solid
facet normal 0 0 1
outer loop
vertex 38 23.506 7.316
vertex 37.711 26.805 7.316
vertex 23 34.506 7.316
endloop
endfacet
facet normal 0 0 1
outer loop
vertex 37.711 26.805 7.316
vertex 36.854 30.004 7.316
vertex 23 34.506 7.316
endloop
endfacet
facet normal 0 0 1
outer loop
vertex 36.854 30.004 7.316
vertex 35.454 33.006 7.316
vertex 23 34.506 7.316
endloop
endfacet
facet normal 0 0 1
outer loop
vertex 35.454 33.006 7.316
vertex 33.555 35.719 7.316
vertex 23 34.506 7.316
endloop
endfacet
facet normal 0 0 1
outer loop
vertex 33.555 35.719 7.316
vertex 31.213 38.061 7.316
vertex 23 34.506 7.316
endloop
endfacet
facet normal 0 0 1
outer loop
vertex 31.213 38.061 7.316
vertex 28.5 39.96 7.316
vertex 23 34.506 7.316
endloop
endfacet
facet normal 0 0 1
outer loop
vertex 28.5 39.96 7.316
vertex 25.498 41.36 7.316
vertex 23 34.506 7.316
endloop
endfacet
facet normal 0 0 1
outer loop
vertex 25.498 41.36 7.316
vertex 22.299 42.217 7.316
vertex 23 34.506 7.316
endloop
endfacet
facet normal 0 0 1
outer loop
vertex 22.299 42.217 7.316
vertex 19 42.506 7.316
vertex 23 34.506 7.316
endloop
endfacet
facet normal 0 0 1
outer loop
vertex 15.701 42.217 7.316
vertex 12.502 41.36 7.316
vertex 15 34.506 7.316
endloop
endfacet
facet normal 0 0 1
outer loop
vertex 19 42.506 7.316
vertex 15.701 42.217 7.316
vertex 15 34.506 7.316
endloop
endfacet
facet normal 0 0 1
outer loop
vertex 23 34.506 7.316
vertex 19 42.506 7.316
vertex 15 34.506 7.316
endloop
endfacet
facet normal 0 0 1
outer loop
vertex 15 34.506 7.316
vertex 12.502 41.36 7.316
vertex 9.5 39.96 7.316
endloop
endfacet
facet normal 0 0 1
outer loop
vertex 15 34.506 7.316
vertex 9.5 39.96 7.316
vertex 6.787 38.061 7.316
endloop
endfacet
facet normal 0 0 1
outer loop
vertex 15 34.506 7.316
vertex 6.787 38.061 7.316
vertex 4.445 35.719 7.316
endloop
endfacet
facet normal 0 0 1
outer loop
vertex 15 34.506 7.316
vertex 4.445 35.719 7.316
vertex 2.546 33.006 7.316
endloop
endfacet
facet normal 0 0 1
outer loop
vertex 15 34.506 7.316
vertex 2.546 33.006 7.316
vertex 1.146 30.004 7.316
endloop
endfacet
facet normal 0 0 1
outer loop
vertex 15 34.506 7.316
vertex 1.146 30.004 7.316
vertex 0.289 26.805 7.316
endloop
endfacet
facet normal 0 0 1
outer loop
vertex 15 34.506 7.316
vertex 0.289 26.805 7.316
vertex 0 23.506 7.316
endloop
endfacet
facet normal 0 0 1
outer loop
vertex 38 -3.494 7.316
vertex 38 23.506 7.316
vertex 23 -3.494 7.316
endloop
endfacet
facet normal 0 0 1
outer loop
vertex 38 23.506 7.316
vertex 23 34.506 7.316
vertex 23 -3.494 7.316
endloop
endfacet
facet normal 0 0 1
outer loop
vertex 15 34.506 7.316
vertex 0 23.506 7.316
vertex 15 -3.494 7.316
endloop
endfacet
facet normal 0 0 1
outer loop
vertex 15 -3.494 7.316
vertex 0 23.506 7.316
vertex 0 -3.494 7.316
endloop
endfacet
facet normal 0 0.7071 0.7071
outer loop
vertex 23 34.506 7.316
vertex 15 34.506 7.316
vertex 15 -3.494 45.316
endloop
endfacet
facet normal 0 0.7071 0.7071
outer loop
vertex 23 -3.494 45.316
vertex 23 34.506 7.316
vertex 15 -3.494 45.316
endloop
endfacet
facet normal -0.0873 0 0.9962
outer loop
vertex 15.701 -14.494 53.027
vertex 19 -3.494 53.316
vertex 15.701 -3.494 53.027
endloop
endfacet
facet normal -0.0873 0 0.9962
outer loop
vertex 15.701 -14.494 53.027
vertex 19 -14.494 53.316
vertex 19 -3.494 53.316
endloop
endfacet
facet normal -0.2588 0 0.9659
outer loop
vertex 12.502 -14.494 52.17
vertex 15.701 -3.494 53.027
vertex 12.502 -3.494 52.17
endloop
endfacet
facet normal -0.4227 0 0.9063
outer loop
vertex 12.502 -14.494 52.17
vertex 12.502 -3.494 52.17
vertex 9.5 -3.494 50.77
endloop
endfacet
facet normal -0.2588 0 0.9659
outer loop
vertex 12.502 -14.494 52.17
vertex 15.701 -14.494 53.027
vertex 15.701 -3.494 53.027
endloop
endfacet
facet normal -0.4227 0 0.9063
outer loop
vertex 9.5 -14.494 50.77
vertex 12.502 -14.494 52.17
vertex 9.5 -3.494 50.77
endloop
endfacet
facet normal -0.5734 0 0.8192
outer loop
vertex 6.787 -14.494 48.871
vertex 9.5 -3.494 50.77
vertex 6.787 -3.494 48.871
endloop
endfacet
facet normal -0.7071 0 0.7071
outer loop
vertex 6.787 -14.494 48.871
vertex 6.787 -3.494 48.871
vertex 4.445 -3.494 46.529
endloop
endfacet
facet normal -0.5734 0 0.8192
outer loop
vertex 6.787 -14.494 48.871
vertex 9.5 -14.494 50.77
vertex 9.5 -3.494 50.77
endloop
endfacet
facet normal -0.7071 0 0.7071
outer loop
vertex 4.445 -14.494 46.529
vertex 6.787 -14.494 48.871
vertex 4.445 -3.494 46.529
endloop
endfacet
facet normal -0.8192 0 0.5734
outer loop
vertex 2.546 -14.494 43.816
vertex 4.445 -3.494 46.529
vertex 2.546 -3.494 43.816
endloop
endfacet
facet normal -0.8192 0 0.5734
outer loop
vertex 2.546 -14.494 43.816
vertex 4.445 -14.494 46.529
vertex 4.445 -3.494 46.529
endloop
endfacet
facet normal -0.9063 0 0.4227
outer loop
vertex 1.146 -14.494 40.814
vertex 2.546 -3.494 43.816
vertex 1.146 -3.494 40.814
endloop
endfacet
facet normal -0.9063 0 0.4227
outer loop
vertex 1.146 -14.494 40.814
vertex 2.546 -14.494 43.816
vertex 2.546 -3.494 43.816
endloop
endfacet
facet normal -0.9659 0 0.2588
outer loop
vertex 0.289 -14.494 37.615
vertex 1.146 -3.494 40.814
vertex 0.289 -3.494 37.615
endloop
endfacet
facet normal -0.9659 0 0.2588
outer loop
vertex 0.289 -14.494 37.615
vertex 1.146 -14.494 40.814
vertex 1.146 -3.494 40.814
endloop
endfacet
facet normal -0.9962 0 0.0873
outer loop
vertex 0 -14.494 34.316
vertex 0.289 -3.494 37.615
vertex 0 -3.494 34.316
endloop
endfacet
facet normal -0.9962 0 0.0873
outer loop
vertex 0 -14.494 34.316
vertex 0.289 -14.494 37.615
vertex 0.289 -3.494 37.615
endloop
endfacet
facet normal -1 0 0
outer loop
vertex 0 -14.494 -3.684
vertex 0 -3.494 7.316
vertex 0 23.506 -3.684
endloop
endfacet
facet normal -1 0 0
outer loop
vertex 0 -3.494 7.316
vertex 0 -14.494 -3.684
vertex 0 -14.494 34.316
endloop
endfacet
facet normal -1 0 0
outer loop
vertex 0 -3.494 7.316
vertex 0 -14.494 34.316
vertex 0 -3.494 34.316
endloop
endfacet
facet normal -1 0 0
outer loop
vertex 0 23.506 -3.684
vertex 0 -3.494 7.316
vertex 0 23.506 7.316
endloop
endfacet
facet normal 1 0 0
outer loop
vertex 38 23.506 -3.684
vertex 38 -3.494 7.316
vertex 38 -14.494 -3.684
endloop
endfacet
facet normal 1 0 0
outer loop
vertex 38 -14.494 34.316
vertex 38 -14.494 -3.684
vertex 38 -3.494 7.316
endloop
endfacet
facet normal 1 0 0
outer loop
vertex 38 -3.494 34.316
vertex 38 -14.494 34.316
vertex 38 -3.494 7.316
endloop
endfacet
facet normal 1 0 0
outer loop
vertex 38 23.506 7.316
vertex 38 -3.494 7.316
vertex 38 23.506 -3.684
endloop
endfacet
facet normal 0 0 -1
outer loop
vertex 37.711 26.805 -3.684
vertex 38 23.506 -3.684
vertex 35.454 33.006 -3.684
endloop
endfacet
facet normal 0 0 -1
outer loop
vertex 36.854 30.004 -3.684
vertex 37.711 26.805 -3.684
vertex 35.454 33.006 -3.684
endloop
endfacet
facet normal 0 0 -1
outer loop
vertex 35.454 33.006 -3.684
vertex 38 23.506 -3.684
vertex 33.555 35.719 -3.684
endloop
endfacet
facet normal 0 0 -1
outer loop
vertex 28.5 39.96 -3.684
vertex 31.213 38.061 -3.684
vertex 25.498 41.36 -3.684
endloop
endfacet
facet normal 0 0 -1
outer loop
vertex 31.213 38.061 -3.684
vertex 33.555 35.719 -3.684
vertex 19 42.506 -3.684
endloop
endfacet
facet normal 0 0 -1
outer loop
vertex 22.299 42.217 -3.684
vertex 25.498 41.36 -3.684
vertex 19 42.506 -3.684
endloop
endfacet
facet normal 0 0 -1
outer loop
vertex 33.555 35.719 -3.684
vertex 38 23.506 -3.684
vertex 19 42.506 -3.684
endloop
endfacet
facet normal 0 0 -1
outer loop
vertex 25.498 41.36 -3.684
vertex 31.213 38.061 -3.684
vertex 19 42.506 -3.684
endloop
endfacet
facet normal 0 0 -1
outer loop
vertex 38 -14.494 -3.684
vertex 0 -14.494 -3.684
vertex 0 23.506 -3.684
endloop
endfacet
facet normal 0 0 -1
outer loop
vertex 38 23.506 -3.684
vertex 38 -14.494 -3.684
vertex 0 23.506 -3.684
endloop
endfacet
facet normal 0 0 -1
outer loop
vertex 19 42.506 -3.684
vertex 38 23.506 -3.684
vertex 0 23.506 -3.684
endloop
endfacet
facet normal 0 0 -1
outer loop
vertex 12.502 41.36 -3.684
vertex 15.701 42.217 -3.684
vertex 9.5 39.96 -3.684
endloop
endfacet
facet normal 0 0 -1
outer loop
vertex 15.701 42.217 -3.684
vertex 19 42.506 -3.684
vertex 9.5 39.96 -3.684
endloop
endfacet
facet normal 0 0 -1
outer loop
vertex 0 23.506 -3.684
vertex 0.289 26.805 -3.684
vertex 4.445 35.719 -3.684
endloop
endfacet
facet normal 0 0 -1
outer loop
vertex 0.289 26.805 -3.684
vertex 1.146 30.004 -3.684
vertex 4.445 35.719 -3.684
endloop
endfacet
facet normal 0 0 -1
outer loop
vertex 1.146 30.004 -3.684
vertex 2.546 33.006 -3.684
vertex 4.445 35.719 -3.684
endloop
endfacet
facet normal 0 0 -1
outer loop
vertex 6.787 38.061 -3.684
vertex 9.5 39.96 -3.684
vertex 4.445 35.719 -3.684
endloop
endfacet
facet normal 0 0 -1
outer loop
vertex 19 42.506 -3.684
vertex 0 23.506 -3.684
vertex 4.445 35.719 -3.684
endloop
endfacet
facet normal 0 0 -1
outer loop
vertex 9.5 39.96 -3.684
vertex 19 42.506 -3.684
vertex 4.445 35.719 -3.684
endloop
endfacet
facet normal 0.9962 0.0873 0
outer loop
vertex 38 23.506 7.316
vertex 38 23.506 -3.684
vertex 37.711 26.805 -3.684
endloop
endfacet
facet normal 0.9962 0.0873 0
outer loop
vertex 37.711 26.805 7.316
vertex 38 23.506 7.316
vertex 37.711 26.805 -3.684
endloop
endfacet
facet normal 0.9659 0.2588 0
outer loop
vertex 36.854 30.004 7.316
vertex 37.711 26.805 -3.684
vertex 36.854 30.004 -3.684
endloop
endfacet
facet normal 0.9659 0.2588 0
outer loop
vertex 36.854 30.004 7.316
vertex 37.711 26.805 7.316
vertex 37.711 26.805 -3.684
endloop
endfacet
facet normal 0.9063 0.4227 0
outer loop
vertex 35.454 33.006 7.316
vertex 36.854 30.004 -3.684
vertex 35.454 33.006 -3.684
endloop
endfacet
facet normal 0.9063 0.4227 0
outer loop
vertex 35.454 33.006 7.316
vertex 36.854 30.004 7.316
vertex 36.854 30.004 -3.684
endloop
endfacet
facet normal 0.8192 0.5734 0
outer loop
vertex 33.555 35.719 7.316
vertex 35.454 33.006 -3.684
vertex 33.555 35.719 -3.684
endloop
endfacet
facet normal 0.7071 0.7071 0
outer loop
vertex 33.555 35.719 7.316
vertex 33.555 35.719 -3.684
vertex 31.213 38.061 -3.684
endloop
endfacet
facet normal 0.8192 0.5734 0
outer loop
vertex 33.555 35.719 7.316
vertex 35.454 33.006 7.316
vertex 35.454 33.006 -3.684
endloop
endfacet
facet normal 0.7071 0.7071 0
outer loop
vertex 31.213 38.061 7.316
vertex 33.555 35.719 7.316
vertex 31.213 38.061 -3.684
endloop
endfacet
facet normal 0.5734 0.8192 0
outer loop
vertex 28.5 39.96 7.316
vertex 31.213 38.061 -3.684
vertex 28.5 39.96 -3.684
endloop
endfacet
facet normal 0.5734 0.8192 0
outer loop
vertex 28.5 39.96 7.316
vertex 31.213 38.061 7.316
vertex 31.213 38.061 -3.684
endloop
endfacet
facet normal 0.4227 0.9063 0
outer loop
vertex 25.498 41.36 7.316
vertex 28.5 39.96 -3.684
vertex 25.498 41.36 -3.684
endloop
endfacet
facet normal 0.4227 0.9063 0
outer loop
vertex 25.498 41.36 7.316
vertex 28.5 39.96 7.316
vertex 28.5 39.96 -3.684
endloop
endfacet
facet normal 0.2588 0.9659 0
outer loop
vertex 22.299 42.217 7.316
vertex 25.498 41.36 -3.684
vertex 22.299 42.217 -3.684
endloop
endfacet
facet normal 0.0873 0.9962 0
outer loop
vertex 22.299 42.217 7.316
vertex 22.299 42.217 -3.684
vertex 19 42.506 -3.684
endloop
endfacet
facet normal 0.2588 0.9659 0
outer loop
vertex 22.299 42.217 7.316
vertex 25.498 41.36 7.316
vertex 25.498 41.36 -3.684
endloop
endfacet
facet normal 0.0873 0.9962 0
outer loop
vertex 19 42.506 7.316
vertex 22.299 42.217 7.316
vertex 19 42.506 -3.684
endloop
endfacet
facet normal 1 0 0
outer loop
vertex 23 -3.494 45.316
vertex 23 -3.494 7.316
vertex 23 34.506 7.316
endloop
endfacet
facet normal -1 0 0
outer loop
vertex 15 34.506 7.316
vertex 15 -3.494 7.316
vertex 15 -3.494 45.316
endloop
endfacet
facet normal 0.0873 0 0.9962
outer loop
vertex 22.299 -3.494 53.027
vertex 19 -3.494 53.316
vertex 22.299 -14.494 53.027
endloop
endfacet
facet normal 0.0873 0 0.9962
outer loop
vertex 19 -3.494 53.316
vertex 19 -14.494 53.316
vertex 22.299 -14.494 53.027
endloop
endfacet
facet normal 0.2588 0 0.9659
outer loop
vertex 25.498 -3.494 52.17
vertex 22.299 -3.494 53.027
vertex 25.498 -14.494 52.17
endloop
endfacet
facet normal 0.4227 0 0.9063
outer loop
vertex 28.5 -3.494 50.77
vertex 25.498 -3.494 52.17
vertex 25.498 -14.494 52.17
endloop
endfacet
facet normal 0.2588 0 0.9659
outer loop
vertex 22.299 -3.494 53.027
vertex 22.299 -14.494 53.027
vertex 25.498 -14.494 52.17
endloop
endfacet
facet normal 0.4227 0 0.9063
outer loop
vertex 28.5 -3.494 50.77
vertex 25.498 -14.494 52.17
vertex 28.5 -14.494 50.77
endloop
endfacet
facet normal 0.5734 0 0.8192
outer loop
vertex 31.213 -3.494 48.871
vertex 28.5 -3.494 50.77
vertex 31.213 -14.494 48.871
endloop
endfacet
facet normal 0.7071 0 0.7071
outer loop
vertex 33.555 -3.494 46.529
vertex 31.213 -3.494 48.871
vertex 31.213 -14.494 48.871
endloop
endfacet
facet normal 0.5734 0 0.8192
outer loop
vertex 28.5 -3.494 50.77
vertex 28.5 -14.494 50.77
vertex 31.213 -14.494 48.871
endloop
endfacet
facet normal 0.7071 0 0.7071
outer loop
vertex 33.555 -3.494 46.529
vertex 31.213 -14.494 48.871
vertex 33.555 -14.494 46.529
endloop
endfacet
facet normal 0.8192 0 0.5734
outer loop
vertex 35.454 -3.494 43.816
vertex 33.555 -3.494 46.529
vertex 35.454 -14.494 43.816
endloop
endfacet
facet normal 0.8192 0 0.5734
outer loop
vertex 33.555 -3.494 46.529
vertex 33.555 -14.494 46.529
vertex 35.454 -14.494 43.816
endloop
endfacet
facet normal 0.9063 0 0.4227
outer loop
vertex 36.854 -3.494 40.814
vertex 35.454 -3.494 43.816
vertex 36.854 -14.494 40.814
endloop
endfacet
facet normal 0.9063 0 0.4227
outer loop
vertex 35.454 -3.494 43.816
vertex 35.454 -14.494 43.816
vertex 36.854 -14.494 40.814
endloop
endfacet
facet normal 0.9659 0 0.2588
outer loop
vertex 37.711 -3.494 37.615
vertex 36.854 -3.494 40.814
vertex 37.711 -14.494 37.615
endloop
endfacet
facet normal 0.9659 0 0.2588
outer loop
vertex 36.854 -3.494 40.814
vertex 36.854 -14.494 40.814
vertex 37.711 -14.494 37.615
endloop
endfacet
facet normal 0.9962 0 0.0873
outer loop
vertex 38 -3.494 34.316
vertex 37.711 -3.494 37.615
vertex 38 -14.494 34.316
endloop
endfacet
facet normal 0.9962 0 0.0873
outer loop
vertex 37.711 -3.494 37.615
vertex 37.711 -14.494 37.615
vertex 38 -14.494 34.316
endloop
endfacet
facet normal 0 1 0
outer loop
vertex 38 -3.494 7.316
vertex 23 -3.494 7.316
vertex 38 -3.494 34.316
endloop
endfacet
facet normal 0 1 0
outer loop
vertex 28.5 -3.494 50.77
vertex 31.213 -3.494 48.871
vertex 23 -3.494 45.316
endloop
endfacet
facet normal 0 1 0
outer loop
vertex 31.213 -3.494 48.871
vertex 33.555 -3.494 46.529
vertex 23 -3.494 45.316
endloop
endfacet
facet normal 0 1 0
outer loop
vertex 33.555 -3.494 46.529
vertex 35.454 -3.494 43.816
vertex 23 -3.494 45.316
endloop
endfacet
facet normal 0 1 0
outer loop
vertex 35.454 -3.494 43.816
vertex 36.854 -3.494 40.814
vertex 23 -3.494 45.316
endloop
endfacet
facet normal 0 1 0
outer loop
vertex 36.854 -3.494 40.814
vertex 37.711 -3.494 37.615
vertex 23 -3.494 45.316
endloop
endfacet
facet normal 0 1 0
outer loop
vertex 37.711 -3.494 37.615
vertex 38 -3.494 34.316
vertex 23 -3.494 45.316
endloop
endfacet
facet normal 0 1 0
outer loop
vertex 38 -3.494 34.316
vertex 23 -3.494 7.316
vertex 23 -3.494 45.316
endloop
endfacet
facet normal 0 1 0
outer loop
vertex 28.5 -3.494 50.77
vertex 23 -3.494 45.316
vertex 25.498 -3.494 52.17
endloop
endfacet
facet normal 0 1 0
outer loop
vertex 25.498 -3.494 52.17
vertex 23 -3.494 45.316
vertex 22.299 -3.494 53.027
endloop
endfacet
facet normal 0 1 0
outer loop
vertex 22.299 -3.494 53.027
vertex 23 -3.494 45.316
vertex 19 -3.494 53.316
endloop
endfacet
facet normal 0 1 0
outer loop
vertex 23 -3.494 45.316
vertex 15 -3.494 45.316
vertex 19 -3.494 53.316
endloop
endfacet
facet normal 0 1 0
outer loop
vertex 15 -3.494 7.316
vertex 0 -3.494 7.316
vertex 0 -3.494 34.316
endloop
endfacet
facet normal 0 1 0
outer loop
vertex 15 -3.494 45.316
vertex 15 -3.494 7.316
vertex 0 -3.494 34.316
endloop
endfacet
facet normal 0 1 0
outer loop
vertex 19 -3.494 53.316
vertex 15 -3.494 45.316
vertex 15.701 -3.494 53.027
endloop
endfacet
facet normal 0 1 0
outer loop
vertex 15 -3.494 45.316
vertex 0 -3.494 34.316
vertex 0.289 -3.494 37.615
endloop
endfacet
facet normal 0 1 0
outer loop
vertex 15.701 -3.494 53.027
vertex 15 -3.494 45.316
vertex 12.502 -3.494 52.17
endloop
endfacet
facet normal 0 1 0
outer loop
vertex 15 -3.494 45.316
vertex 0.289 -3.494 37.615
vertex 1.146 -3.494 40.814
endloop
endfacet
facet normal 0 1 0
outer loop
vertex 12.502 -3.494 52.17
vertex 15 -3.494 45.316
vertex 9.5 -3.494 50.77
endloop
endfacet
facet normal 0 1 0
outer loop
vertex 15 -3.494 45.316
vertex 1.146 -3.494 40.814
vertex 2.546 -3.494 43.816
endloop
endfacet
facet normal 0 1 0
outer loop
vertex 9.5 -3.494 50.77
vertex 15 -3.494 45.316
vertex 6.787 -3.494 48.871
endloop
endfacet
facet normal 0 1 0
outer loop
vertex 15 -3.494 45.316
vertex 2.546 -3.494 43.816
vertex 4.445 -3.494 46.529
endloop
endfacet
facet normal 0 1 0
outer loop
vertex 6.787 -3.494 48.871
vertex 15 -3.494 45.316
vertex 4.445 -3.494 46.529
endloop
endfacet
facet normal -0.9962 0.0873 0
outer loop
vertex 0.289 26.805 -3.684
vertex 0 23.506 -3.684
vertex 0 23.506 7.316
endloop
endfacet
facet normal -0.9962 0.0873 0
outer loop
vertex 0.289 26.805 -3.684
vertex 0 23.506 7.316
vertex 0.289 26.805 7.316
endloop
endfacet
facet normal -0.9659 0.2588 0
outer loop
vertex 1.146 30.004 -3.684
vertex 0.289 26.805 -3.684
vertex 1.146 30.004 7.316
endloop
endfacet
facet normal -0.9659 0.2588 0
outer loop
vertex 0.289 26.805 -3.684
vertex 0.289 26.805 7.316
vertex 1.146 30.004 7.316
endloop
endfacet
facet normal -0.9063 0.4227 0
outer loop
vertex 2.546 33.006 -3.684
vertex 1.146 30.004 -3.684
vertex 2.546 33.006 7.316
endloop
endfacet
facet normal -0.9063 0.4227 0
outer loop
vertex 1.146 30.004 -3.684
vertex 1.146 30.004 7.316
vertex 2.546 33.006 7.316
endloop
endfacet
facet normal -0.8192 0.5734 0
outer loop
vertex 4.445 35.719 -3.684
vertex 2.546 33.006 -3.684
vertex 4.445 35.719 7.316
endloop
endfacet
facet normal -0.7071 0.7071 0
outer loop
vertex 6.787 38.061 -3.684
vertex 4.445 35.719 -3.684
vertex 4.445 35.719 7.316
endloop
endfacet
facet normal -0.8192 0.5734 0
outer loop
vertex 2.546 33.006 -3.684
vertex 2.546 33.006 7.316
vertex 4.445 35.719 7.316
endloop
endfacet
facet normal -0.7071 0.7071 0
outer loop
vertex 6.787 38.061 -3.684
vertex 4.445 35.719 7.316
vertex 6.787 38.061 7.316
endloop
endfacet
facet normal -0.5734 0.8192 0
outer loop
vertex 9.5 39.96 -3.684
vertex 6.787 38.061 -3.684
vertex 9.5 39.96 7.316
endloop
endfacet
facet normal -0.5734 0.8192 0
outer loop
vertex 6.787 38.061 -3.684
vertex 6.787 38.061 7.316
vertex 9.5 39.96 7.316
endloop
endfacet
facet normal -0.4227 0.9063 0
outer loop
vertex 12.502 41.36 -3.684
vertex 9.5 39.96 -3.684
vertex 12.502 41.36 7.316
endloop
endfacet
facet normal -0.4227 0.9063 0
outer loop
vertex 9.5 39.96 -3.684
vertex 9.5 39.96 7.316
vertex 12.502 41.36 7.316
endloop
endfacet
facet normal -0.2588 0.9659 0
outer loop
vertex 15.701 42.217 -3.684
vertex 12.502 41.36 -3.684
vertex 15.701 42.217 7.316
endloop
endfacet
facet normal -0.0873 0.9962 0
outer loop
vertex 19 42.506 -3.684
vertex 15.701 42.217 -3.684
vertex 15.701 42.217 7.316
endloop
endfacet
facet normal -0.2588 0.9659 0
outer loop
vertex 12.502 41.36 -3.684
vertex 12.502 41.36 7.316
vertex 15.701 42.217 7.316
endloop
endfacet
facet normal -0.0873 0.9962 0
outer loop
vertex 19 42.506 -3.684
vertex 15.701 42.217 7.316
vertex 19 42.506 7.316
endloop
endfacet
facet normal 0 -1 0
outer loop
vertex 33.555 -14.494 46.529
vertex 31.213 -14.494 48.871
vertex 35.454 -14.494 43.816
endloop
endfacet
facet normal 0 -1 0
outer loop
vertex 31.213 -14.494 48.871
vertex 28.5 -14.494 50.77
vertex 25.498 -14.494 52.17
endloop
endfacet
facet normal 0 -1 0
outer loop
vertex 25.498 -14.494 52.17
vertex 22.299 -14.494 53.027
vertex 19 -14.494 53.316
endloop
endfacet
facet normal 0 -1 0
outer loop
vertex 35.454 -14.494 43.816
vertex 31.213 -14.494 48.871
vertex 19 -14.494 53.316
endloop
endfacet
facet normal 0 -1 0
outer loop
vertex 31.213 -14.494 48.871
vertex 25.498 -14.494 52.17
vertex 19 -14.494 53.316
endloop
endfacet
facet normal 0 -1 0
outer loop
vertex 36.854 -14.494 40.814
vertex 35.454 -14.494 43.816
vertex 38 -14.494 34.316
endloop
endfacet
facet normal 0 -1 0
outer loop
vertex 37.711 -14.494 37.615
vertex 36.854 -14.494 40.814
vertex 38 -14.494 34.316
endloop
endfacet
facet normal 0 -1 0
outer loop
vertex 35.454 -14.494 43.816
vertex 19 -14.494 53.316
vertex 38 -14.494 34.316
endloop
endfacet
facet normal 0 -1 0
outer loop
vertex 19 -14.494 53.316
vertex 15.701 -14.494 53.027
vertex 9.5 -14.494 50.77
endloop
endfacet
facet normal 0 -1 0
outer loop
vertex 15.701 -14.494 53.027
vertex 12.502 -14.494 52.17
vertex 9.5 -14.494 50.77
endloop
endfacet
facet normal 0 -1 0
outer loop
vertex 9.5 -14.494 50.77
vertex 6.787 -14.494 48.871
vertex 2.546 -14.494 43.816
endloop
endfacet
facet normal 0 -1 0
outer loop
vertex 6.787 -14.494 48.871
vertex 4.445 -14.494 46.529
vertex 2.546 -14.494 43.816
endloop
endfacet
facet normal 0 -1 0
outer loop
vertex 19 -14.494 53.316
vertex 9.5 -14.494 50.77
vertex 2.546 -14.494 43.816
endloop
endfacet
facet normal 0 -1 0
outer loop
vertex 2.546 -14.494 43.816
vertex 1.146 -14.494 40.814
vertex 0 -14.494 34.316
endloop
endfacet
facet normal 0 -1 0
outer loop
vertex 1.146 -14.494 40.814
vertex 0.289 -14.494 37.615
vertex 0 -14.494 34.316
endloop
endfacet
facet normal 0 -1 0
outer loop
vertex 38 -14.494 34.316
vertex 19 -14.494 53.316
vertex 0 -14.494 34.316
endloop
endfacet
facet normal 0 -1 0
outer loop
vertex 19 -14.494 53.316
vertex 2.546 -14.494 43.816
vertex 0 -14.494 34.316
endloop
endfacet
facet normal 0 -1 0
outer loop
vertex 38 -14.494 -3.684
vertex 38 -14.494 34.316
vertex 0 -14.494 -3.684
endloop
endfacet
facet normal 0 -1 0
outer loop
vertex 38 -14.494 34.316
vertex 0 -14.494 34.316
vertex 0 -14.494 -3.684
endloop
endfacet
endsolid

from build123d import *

# Parameters (mm, degrees)
F1_DEPTH = 38
F2_R     = 18.99999
F3_R     = 18.99999
F6_DEPTH = 8


# Not quite as in the source:
# - a fillet or chamfer is up to 0.001 mm smaller than in the source, because OpenCascade refuses the exact size


with BuildPart() as f1:
    # F0 (on Right) → F1 (new body)
    with BuildSketch(Plane.YZ):
        Polygon((-14.4942225739, 53.3158381923), (-14.4942225739, -3.6841618077), (42.5057774261, -3.6841618077), (42.5057774261, 7.3158381923), (-3.4942225739, 7.3158381923), (-3.4942225739, 53.3158381923), align=None)
    extrude(amount=F1_DEPTH)

    # F2 (radius 19 in the source; OpenCascade refuses exactly that, so slightly less here)
    f2_edges = [f1.edges().sort_by_distance(p)[0] for p in [
        (38, -8.994223, 53.315838),
        (0, -8.994223, 53.315838),
    ]]
    fillet(f2_edges, radius=F2_R)

    # F3 (radius 19 in the source; OpenCascade refuses exactly that, so slightly less here)
    f3_edges = [f1.edges().sort_by_distance(p)[0] for p in [
        (38, 42.505777, 1.815838),
        (0, 42.505777, 1.815838),
    ]]
    fillet(f3_edges, radius=F3_R)

    # F5 (on offset) → F6 (join)
    with BuildSketch(Plane.YZ.offset(15)):
        Polygon((34.5057774261, 7.3158381923), (-3.4942225739, 45.3158381923), (-3.4942225739, 7.3158381923), align=None)
    extrude(amount=F6_DEPTH)


solid = f1.part
